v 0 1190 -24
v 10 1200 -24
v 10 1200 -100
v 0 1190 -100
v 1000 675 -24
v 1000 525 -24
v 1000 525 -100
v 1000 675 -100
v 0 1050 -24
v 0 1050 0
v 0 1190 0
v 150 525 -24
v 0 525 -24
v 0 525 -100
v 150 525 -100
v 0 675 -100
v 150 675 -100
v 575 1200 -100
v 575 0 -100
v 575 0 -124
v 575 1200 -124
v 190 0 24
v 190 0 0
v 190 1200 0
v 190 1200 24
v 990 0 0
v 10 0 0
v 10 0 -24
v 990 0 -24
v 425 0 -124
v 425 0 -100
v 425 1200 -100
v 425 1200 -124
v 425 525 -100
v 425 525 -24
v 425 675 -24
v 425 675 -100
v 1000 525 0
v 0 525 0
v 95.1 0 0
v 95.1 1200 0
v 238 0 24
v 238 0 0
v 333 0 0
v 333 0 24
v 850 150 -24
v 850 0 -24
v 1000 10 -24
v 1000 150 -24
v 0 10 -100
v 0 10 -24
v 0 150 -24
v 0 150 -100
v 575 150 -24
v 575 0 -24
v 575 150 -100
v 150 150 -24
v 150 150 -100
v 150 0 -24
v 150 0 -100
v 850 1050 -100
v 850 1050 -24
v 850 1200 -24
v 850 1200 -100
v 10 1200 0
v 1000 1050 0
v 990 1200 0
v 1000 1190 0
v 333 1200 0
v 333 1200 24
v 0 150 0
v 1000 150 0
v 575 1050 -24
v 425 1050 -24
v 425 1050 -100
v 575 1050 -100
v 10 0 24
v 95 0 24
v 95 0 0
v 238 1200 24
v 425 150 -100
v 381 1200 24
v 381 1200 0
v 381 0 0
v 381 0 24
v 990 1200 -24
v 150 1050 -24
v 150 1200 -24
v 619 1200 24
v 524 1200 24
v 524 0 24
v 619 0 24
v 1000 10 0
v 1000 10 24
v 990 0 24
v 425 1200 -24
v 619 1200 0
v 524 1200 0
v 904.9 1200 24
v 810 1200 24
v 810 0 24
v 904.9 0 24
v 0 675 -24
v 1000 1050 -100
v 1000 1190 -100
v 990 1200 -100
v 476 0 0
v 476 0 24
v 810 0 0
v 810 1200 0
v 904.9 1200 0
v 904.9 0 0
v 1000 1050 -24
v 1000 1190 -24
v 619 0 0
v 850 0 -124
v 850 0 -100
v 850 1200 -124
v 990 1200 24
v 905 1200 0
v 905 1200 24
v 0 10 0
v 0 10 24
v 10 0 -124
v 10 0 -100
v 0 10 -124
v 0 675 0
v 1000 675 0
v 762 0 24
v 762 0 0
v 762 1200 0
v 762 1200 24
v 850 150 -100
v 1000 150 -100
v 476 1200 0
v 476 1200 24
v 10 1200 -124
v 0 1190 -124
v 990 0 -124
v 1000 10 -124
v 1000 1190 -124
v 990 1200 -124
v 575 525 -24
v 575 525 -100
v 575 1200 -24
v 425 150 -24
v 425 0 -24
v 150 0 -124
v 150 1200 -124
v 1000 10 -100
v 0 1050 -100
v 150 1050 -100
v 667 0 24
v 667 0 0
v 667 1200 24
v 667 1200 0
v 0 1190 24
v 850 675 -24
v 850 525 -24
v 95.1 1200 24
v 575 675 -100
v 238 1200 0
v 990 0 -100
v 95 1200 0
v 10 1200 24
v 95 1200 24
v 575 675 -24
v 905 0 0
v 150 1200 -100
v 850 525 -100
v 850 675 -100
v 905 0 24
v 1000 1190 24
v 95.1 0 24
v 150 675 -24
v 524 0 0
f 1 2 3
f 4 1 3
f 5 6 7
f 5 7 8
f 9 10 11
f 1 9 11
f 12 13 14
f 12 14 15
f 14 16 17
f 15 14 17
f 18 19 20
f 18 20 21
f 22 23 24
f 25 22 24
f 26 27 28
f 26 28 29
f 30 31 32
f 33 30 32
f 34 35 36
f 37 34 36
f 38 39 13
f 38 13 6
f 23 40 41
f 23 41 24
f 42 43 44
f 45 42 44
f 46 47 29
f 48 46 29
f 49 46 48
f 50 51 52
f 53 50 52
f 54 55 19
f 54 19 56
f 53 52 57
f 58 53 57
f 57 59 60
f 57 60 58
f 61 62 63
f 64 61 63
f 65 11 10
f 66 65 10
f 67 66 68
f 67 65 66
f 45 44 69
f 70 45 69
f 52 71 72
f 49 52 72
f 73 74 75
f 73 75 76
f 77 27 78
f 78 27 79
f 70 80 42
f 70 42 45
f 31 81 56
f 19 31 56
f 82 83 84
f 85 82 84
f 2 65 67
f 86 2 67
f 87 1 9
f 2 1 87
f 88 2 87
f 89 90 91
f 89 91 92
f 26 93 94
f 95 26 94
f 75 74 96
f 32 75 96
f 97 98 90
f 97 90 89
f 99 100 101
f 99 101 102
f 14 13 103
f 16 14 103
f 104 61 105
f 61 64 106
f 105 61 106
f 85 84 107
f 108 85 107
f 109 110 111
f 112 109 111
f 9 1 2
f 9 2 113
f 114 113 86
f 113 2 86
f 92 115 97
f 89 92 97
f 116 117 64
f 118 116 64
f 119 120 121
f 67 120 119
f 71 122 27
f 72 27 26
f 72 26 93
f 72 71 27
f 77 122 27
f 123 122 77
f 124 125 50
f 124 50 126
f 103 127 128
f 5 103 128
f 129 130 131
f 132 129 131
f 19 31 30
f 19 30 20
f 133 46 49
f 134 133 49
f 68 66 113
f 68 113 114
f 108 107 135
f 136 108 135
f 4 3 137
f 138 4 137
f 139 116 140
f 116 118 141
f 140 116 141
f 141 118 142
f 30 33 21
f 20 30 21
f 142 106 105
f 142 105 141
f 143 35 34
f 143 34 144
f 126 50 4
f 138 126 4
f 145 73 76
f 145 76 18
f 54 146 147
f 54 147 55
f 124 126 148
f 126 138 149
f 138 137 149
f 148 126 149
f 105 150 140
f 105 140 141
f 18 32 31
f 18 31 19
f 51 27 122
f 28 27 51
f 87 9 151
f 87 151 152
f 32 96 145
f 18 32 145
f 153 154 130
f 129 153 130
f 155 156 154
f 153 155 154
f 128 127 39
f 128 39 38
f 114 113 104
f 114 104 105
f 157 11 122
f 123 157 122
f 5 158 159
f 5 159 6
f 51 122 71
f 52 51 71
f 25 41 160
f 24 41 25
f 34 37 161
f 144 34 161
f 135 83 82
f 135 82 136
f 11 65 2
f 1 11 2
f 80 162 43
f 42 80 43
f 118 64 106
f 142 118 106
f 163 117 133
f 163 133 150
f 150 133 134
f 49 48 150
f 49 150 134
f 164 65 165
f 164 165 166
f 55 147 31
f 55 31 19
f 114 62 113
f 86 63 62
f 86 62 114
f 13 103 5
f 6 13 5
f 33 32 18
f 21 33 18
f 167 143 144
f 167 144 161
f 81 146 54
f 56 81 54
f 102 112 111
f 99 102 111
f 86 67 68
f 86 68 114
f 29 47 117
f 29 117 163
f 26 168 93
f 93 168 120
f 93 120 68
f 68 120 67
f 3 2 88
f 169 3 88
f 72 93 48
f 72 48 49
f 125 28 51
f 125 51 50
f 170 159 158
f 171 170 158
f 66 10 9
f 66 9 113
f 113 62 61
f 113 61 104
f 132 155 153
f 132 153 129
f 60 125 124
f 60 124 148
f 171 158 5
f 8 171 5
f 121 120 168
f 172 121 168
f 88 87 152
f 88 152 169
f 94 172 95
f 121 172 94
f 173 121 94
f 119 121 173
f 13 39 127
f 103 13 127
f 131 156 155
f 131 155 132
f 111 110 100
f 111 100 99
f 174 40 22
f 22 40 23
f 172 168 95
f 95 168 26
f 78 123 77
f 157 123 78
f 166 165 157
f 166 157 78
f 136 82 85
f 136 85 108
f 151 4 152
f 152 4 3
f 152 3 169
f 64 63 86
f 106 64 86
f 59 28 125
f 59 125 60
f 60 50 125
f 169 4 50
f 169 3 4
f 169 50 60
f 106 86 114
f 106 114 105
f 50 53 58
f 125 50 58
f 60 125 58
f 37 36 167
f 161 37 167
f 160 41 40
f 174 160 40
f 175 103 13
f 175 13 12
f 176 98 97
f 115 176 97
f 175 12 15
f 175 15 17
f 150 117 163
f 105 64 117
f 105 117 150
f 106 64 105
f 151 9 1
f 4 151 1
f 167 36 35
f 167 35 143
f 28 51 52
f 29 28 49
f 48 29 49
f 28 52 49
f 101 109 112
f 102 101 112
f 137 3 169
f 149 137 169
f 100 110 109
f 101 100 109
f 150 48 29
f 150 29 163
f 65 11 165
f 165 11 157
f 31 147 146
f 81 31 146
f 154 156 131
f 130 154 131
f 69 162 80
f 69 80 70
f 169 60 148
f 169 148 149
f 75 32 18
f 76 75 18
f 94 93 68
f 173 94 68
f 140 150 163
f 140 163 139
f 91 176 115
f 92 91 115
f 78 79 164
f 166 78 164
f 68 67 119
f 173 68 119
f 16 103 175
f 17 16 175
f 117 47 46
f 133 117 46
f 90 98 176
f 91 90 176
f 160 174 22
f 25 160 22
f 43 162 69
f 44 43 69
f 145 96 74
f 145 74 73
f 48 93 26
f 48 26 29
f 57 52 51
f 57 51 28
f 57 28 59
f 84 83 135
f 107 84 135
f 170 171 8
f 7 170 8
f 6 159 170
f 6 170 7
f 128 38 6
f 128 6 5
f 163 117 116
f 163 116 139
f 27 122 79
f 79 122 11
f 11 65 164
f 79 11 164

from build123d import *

# Parameters (mm, degrees)
F0_W        = 95
F0_H        = 800
F0_H_2      = 400
F1_DEPTH    = 24
F0_W_2      = 94.9
F2_W        = 1000
F2_H        = 150
F3_DEPTH    = 24
F5_W        = 150
F5_H        = 150
F6_DEPTH    = 76
F8_W        = 150
F8_H        = 1200
F9_DEPTH    = 24
F10_SIZE    = 10
F10_2_SIZE  = 10
F10_3_SIZE  = 10
F10_4_SIZE  = 10
F10_5_SIZE  = 10
F10_6_SIZE  = 10
F10_7_SIZE  = 10
F10_8_SIZE  = 10
F10_9_SIZE  = 10
F10_10_SIZE = 10


# Not quite as in the source:
# - a feature names something its author has since deleted; it is built from what else it names


with BuildPart() as f1:
    # F0 (on Top) → F1 (new body)
    with BuildSketch(Plane.XY):
        with Locations((47.5, 400)):
            Rectangle(F0_W, F0_H)
        with Locations((47.5, 1000)):
            Rectangle(F0_W, F0_H_2)
    extrude(amount=F1_DEPTH)

    # F10#3
    f10_3_edges = [f1.edges().sort_by_distance(p)[0] for p in [
        (0, 0, 12),
        (0, 1200, 12),
    ]]
    chamfer(f10_3_edges, length=F10_3_SIZE)


with BuildPart() as f1b:
    # F0 (on Top) → F1, piece 2 (new body)
    with BuildSketch(Plane.XY):
        with Locations((952.5, 1000)):
            Rectangle(F0_W, F0_H_2)
        with Locations((952.5, 400)):
            Rectangle(F0_W, F0_H)
    extrude(amount=F1_DEPTH)

    # F10#7
    f10_7_edges = [f1b.edges().sort_by_distance(p)[0] for p in [
        (1000, 0, 12),
        (1000, 1200, 12),
    ]]
    chamfer(f10_7_edges, length=F10_7_SIZE)


with BuildPart() as f1c:
    # F0 (on Top) → F1, piece 3 (new body)
    with BuildSketch(Plane.XY):
        with Locations((857.45, 1000)):
            Rectangle(F0_W_2, F0_H_2)
        with Locations((857.45, 400)):
            Rectangle(F0_W_2, F0_H)
    extrude(amount=F1_DEPTH)


with BuildPart() as f1d:
    # F0 (on Top) → F1, piece 4 (new body)
    with BuildSketch(Plane.XY):
        with Locations((714.5, 1000)):
            Rectangle(F0_W, F0_H_2)
        with Locations((714.5, 400)):
            Rectangle(F0_W, F0_H)
    extrude(amount=F1_DEPTH)


with BuildPart() as f1e:
    # F0 (on Top) → F1, piece 5 (new body)
    with BuildSketch(Plane.XY):
        with Locations((571.5, 1000)):
            Rectangle(F0_W, F0_H_2)
        with Locations((571.5, 400)):
            Rectangle(F0_W, F0_H)
    extrude(amount=F1_DEPTH)


with BuildPart() as f1f:
    # F0 (on Top) → F1, piece 6 (new body)
    with BuildSketch(Plane.XY):
        with Locations((428.5, 1000)):
            Rectangle(F0_W, F0_H_2)
        with Locations((428.5, 400)):
            Rectangle(F0_W, F0_H)
    extrude(amount=F1_DEPTH)


with BuildPart() as f1g:
    # F0 (on Top) → F1, piece 7 (new body)
    with BuildSketch(Plane.XY):
        with Locations((285.5, 1000)):
            Rectangle(F0_W, F0_H_2)
        with Locations((285.5, 400)):
            Rectangle(F0_W, F0_H)
    extrude(amount=F1_DEPTH)


with BuildPart() as f1h:
    # F0 (on Top) → F1, piece 8 (new body)
    with BuildSketch(Plane.XY):
        with Locations((142.55, 1000)):
            Rectangle(F0_W_2, F0_H_2)
        with Locations((142.55, 400)):
            Rectangle(F0_W_2, F0_H)
    extrude(amount=F1_DEPTH)


with BuildPart() as f3:
    # F2 (on Top) → F3 (new body)
    with BuildSketch(Plane.XY):
        with Locations((500, 75)):
            Rectangle(F2_W, F2_H)
    extrude(amount=-F3_DEPTH)

    # F10#2
    f10_2_edges = [f3.edges().sort_by_distance(p)[0] for p in [
        (0, 0, -12),
        (1000, 0, -12),
    ]]
    chamfer(f10_2_edges, length=F10_2_SIZE)


with BuildPart() as f3b:
    # F2 (on Top) → F3, piece 2 (new body)
    with BuildSketch(Plane.XY):
        with Locations((500, 600)):
            Rectangle(F2_W, F2_H)
    extrude(amount=-F3_DEPTH)


with BuildPart() as f3c:
    # F2 (on Top) → F3, piece 3 (new body)
    with BuildSketch(Plane.XY):
        with Locations((500, 1125)):
            Rectangle(F2_W, F2_H)
    extrude(amount=-F3_DEPTH)

    # F10#8
    f10_8_edges = [f3c.edges().sort_by_distance(p)[0] for p in [
        (1000, 1200, -12),
        (0, 1200, -12),
    ]]
    chamfer(f10_8_edges, length=F10_8_SIZE)


with BuildPart() as f6:
    # F5 (on offset) → F6 (new body)
    with BuildSketch(Plane.XY.offset(-24)):
        with Locations((75, 75)):
            Rectangle(F5_W, F5_H)
    extrude(amount=-F6_DEPTH)

    # F10
    f10_edges = [f6.edges().sort_by_distance(p)[0] for p in [
        (0, 0, -62),
    ]]
    chamfer(f10_edges, length=F10_SIZE)


with BuildPart() as f6b:
    # F5 (on offset) → F6, piece 2 (new body)
    with BuildSketch(Plane.XY.offset(-24)):
        with Locations((75, 600)):
            Rectangle(F5_W, F5_H)
    extrude(amount=-F6_DEPTH)


with BuildPart() as f6c:
    # F5 (on offset) → F6, piece 3 (new body)
    with BuildSketch(Plane.XY.offset(-24)):
        with Locations((75, 1125)):
            Rectangle(F5_W, F5_H)
    extrude(amount=-F6_DEPTH)

    # F10#10
    f10_10_edges = [f6c.edges().sort_by_distance(p)[0] for p in [
        (0, 1200, -62),
    ]]
    chamfer(f10_10_edges, length=F10_10_SIZE)


with BuildPart() as f6d:
    # F5 (on offset) → F6, piece 4 (new body)
    with BuildSketch(Plane.XY.offset(-24)):
        with Locations((500, 75)):
            Rectangle(F5_W, F5_H)
    extrude(amount=-F6_DEPTH)


with BuildPart() as f6e:
    # F5 (on offset) → F6, piece 5 (new body)
    with BuildSketch(Plane.XY.offset(-24)):
        with Locations((500, 1125)):
            Rectangle(F5_W, F5_H)
    extrude(amount=-F6_DEPTH)


with BuildPart() as f6f:
    # F5 (on offset) → F6, piece 6 (new body)
    with BuildSketch(Plane.XY.offset(-24)):
        with Locations((925, 75)):
            Rectangle(F5_W, F5_H)
    extrude(amount=-F6_DEPTH)

    # F10#6
    f10_6_edges = [f6f.edges().sort_by_distance(p)[0] for p in [
        (1000, 0, -62),
    ]]
    chamfer(f10_6_edges, length=F10_6_SIZE)


with BuildPart() as f6g:
    # F5 (on offset) → F6, piece 7 (new body)
    with BuildSketch(Plane.XY.offset(-24)):
        with Locations((925, 1125)):
            Rectangle(F5_W, F5_H)
    extrude(amount=-F6_DEPTH)

    # F10#9
    f10_9_edges = [f6g.edges().sort_by_distance(p)[0] for p in [
        (1000, 1200, -62),
    ]]
    chamfer(f10_9_edges, length=F10_9_SIZE)


with BuildPart() as f6h:
    # F5 (on offset) → F6, piece 8 (new body)
    with BuildSketch(Plane.XY.offset(-24)):
        with Locations((925, 600)):
            Rectangle(F5_W, F5_H)
    extrude(amount=-F6_DEPTH)


with BuildPart() as f6i:
    # F5 (on offset) → F6, piece 9 (new body)
    with BuildSketch(Plane.XY.offset(-24)):
        with Locations((500, 600)):
            Rectangle(F5_W, F5_H)
    extrude(amount=-F6_DEPTH)


with BuildPart() as f9:
    # F8 (on offset) → F9 (new body)
    with BuildSketch(Plane.XY.offset(-100)):
        with Locations((75, 600)):
            Rectangle(F8_W, F8_H)
    extrude(amount=-F9_DEPTH)

    # F10#4
    f10_4_edges = [f9.edges().sort_by_distance(p)[0] for p in [
        (0, 0, -112),
        (0, 1200, -112),
    ]]
    chamfer(f10_4_edges, length=F10_4_SIZE)


with BuildPart() as f9b:
    # F8 (on offset) → F9, piece 2 (new body)
    with BuildSketch(Plane.XY.offset(-100)):
        with Locations((500, 600)):
            Rectangle(F8_W, F8_H)
    extrude(amount=-F9_DEPTH)


with BuildPart() as f9c:
    # F8 (on offset) → F9, piece 3 (new body)
    with BuildSketch(Plane.XY.offset(-100)):
        with Locations((925, 600)):
            Rectangle(F8_W, F8_H)
    extrude(amount=-F9_DEPTH)

    # F10#5
    f10_5_edges = [f9c.edges().sort_by_distance(p)[0] for p in [
        (1000, 0, -112),
        (1000, 1200, -112),
    ]]
    chamfer(f10_5_edges, length=F10_5_SIZE)


solid = Compound([f1.part, f1b.part, f1c.part, f1d.part, f1e.part, f1f.part, f1g.part, f1h.part, f3.part, f3b.part, f3c.part, f6.part, f6b.part, f6c.part, f6d.part, f6e.part, f6f.part, f6g.part, f6h.part, f6i.part, f9.part, f9b.part, f9c.part])
